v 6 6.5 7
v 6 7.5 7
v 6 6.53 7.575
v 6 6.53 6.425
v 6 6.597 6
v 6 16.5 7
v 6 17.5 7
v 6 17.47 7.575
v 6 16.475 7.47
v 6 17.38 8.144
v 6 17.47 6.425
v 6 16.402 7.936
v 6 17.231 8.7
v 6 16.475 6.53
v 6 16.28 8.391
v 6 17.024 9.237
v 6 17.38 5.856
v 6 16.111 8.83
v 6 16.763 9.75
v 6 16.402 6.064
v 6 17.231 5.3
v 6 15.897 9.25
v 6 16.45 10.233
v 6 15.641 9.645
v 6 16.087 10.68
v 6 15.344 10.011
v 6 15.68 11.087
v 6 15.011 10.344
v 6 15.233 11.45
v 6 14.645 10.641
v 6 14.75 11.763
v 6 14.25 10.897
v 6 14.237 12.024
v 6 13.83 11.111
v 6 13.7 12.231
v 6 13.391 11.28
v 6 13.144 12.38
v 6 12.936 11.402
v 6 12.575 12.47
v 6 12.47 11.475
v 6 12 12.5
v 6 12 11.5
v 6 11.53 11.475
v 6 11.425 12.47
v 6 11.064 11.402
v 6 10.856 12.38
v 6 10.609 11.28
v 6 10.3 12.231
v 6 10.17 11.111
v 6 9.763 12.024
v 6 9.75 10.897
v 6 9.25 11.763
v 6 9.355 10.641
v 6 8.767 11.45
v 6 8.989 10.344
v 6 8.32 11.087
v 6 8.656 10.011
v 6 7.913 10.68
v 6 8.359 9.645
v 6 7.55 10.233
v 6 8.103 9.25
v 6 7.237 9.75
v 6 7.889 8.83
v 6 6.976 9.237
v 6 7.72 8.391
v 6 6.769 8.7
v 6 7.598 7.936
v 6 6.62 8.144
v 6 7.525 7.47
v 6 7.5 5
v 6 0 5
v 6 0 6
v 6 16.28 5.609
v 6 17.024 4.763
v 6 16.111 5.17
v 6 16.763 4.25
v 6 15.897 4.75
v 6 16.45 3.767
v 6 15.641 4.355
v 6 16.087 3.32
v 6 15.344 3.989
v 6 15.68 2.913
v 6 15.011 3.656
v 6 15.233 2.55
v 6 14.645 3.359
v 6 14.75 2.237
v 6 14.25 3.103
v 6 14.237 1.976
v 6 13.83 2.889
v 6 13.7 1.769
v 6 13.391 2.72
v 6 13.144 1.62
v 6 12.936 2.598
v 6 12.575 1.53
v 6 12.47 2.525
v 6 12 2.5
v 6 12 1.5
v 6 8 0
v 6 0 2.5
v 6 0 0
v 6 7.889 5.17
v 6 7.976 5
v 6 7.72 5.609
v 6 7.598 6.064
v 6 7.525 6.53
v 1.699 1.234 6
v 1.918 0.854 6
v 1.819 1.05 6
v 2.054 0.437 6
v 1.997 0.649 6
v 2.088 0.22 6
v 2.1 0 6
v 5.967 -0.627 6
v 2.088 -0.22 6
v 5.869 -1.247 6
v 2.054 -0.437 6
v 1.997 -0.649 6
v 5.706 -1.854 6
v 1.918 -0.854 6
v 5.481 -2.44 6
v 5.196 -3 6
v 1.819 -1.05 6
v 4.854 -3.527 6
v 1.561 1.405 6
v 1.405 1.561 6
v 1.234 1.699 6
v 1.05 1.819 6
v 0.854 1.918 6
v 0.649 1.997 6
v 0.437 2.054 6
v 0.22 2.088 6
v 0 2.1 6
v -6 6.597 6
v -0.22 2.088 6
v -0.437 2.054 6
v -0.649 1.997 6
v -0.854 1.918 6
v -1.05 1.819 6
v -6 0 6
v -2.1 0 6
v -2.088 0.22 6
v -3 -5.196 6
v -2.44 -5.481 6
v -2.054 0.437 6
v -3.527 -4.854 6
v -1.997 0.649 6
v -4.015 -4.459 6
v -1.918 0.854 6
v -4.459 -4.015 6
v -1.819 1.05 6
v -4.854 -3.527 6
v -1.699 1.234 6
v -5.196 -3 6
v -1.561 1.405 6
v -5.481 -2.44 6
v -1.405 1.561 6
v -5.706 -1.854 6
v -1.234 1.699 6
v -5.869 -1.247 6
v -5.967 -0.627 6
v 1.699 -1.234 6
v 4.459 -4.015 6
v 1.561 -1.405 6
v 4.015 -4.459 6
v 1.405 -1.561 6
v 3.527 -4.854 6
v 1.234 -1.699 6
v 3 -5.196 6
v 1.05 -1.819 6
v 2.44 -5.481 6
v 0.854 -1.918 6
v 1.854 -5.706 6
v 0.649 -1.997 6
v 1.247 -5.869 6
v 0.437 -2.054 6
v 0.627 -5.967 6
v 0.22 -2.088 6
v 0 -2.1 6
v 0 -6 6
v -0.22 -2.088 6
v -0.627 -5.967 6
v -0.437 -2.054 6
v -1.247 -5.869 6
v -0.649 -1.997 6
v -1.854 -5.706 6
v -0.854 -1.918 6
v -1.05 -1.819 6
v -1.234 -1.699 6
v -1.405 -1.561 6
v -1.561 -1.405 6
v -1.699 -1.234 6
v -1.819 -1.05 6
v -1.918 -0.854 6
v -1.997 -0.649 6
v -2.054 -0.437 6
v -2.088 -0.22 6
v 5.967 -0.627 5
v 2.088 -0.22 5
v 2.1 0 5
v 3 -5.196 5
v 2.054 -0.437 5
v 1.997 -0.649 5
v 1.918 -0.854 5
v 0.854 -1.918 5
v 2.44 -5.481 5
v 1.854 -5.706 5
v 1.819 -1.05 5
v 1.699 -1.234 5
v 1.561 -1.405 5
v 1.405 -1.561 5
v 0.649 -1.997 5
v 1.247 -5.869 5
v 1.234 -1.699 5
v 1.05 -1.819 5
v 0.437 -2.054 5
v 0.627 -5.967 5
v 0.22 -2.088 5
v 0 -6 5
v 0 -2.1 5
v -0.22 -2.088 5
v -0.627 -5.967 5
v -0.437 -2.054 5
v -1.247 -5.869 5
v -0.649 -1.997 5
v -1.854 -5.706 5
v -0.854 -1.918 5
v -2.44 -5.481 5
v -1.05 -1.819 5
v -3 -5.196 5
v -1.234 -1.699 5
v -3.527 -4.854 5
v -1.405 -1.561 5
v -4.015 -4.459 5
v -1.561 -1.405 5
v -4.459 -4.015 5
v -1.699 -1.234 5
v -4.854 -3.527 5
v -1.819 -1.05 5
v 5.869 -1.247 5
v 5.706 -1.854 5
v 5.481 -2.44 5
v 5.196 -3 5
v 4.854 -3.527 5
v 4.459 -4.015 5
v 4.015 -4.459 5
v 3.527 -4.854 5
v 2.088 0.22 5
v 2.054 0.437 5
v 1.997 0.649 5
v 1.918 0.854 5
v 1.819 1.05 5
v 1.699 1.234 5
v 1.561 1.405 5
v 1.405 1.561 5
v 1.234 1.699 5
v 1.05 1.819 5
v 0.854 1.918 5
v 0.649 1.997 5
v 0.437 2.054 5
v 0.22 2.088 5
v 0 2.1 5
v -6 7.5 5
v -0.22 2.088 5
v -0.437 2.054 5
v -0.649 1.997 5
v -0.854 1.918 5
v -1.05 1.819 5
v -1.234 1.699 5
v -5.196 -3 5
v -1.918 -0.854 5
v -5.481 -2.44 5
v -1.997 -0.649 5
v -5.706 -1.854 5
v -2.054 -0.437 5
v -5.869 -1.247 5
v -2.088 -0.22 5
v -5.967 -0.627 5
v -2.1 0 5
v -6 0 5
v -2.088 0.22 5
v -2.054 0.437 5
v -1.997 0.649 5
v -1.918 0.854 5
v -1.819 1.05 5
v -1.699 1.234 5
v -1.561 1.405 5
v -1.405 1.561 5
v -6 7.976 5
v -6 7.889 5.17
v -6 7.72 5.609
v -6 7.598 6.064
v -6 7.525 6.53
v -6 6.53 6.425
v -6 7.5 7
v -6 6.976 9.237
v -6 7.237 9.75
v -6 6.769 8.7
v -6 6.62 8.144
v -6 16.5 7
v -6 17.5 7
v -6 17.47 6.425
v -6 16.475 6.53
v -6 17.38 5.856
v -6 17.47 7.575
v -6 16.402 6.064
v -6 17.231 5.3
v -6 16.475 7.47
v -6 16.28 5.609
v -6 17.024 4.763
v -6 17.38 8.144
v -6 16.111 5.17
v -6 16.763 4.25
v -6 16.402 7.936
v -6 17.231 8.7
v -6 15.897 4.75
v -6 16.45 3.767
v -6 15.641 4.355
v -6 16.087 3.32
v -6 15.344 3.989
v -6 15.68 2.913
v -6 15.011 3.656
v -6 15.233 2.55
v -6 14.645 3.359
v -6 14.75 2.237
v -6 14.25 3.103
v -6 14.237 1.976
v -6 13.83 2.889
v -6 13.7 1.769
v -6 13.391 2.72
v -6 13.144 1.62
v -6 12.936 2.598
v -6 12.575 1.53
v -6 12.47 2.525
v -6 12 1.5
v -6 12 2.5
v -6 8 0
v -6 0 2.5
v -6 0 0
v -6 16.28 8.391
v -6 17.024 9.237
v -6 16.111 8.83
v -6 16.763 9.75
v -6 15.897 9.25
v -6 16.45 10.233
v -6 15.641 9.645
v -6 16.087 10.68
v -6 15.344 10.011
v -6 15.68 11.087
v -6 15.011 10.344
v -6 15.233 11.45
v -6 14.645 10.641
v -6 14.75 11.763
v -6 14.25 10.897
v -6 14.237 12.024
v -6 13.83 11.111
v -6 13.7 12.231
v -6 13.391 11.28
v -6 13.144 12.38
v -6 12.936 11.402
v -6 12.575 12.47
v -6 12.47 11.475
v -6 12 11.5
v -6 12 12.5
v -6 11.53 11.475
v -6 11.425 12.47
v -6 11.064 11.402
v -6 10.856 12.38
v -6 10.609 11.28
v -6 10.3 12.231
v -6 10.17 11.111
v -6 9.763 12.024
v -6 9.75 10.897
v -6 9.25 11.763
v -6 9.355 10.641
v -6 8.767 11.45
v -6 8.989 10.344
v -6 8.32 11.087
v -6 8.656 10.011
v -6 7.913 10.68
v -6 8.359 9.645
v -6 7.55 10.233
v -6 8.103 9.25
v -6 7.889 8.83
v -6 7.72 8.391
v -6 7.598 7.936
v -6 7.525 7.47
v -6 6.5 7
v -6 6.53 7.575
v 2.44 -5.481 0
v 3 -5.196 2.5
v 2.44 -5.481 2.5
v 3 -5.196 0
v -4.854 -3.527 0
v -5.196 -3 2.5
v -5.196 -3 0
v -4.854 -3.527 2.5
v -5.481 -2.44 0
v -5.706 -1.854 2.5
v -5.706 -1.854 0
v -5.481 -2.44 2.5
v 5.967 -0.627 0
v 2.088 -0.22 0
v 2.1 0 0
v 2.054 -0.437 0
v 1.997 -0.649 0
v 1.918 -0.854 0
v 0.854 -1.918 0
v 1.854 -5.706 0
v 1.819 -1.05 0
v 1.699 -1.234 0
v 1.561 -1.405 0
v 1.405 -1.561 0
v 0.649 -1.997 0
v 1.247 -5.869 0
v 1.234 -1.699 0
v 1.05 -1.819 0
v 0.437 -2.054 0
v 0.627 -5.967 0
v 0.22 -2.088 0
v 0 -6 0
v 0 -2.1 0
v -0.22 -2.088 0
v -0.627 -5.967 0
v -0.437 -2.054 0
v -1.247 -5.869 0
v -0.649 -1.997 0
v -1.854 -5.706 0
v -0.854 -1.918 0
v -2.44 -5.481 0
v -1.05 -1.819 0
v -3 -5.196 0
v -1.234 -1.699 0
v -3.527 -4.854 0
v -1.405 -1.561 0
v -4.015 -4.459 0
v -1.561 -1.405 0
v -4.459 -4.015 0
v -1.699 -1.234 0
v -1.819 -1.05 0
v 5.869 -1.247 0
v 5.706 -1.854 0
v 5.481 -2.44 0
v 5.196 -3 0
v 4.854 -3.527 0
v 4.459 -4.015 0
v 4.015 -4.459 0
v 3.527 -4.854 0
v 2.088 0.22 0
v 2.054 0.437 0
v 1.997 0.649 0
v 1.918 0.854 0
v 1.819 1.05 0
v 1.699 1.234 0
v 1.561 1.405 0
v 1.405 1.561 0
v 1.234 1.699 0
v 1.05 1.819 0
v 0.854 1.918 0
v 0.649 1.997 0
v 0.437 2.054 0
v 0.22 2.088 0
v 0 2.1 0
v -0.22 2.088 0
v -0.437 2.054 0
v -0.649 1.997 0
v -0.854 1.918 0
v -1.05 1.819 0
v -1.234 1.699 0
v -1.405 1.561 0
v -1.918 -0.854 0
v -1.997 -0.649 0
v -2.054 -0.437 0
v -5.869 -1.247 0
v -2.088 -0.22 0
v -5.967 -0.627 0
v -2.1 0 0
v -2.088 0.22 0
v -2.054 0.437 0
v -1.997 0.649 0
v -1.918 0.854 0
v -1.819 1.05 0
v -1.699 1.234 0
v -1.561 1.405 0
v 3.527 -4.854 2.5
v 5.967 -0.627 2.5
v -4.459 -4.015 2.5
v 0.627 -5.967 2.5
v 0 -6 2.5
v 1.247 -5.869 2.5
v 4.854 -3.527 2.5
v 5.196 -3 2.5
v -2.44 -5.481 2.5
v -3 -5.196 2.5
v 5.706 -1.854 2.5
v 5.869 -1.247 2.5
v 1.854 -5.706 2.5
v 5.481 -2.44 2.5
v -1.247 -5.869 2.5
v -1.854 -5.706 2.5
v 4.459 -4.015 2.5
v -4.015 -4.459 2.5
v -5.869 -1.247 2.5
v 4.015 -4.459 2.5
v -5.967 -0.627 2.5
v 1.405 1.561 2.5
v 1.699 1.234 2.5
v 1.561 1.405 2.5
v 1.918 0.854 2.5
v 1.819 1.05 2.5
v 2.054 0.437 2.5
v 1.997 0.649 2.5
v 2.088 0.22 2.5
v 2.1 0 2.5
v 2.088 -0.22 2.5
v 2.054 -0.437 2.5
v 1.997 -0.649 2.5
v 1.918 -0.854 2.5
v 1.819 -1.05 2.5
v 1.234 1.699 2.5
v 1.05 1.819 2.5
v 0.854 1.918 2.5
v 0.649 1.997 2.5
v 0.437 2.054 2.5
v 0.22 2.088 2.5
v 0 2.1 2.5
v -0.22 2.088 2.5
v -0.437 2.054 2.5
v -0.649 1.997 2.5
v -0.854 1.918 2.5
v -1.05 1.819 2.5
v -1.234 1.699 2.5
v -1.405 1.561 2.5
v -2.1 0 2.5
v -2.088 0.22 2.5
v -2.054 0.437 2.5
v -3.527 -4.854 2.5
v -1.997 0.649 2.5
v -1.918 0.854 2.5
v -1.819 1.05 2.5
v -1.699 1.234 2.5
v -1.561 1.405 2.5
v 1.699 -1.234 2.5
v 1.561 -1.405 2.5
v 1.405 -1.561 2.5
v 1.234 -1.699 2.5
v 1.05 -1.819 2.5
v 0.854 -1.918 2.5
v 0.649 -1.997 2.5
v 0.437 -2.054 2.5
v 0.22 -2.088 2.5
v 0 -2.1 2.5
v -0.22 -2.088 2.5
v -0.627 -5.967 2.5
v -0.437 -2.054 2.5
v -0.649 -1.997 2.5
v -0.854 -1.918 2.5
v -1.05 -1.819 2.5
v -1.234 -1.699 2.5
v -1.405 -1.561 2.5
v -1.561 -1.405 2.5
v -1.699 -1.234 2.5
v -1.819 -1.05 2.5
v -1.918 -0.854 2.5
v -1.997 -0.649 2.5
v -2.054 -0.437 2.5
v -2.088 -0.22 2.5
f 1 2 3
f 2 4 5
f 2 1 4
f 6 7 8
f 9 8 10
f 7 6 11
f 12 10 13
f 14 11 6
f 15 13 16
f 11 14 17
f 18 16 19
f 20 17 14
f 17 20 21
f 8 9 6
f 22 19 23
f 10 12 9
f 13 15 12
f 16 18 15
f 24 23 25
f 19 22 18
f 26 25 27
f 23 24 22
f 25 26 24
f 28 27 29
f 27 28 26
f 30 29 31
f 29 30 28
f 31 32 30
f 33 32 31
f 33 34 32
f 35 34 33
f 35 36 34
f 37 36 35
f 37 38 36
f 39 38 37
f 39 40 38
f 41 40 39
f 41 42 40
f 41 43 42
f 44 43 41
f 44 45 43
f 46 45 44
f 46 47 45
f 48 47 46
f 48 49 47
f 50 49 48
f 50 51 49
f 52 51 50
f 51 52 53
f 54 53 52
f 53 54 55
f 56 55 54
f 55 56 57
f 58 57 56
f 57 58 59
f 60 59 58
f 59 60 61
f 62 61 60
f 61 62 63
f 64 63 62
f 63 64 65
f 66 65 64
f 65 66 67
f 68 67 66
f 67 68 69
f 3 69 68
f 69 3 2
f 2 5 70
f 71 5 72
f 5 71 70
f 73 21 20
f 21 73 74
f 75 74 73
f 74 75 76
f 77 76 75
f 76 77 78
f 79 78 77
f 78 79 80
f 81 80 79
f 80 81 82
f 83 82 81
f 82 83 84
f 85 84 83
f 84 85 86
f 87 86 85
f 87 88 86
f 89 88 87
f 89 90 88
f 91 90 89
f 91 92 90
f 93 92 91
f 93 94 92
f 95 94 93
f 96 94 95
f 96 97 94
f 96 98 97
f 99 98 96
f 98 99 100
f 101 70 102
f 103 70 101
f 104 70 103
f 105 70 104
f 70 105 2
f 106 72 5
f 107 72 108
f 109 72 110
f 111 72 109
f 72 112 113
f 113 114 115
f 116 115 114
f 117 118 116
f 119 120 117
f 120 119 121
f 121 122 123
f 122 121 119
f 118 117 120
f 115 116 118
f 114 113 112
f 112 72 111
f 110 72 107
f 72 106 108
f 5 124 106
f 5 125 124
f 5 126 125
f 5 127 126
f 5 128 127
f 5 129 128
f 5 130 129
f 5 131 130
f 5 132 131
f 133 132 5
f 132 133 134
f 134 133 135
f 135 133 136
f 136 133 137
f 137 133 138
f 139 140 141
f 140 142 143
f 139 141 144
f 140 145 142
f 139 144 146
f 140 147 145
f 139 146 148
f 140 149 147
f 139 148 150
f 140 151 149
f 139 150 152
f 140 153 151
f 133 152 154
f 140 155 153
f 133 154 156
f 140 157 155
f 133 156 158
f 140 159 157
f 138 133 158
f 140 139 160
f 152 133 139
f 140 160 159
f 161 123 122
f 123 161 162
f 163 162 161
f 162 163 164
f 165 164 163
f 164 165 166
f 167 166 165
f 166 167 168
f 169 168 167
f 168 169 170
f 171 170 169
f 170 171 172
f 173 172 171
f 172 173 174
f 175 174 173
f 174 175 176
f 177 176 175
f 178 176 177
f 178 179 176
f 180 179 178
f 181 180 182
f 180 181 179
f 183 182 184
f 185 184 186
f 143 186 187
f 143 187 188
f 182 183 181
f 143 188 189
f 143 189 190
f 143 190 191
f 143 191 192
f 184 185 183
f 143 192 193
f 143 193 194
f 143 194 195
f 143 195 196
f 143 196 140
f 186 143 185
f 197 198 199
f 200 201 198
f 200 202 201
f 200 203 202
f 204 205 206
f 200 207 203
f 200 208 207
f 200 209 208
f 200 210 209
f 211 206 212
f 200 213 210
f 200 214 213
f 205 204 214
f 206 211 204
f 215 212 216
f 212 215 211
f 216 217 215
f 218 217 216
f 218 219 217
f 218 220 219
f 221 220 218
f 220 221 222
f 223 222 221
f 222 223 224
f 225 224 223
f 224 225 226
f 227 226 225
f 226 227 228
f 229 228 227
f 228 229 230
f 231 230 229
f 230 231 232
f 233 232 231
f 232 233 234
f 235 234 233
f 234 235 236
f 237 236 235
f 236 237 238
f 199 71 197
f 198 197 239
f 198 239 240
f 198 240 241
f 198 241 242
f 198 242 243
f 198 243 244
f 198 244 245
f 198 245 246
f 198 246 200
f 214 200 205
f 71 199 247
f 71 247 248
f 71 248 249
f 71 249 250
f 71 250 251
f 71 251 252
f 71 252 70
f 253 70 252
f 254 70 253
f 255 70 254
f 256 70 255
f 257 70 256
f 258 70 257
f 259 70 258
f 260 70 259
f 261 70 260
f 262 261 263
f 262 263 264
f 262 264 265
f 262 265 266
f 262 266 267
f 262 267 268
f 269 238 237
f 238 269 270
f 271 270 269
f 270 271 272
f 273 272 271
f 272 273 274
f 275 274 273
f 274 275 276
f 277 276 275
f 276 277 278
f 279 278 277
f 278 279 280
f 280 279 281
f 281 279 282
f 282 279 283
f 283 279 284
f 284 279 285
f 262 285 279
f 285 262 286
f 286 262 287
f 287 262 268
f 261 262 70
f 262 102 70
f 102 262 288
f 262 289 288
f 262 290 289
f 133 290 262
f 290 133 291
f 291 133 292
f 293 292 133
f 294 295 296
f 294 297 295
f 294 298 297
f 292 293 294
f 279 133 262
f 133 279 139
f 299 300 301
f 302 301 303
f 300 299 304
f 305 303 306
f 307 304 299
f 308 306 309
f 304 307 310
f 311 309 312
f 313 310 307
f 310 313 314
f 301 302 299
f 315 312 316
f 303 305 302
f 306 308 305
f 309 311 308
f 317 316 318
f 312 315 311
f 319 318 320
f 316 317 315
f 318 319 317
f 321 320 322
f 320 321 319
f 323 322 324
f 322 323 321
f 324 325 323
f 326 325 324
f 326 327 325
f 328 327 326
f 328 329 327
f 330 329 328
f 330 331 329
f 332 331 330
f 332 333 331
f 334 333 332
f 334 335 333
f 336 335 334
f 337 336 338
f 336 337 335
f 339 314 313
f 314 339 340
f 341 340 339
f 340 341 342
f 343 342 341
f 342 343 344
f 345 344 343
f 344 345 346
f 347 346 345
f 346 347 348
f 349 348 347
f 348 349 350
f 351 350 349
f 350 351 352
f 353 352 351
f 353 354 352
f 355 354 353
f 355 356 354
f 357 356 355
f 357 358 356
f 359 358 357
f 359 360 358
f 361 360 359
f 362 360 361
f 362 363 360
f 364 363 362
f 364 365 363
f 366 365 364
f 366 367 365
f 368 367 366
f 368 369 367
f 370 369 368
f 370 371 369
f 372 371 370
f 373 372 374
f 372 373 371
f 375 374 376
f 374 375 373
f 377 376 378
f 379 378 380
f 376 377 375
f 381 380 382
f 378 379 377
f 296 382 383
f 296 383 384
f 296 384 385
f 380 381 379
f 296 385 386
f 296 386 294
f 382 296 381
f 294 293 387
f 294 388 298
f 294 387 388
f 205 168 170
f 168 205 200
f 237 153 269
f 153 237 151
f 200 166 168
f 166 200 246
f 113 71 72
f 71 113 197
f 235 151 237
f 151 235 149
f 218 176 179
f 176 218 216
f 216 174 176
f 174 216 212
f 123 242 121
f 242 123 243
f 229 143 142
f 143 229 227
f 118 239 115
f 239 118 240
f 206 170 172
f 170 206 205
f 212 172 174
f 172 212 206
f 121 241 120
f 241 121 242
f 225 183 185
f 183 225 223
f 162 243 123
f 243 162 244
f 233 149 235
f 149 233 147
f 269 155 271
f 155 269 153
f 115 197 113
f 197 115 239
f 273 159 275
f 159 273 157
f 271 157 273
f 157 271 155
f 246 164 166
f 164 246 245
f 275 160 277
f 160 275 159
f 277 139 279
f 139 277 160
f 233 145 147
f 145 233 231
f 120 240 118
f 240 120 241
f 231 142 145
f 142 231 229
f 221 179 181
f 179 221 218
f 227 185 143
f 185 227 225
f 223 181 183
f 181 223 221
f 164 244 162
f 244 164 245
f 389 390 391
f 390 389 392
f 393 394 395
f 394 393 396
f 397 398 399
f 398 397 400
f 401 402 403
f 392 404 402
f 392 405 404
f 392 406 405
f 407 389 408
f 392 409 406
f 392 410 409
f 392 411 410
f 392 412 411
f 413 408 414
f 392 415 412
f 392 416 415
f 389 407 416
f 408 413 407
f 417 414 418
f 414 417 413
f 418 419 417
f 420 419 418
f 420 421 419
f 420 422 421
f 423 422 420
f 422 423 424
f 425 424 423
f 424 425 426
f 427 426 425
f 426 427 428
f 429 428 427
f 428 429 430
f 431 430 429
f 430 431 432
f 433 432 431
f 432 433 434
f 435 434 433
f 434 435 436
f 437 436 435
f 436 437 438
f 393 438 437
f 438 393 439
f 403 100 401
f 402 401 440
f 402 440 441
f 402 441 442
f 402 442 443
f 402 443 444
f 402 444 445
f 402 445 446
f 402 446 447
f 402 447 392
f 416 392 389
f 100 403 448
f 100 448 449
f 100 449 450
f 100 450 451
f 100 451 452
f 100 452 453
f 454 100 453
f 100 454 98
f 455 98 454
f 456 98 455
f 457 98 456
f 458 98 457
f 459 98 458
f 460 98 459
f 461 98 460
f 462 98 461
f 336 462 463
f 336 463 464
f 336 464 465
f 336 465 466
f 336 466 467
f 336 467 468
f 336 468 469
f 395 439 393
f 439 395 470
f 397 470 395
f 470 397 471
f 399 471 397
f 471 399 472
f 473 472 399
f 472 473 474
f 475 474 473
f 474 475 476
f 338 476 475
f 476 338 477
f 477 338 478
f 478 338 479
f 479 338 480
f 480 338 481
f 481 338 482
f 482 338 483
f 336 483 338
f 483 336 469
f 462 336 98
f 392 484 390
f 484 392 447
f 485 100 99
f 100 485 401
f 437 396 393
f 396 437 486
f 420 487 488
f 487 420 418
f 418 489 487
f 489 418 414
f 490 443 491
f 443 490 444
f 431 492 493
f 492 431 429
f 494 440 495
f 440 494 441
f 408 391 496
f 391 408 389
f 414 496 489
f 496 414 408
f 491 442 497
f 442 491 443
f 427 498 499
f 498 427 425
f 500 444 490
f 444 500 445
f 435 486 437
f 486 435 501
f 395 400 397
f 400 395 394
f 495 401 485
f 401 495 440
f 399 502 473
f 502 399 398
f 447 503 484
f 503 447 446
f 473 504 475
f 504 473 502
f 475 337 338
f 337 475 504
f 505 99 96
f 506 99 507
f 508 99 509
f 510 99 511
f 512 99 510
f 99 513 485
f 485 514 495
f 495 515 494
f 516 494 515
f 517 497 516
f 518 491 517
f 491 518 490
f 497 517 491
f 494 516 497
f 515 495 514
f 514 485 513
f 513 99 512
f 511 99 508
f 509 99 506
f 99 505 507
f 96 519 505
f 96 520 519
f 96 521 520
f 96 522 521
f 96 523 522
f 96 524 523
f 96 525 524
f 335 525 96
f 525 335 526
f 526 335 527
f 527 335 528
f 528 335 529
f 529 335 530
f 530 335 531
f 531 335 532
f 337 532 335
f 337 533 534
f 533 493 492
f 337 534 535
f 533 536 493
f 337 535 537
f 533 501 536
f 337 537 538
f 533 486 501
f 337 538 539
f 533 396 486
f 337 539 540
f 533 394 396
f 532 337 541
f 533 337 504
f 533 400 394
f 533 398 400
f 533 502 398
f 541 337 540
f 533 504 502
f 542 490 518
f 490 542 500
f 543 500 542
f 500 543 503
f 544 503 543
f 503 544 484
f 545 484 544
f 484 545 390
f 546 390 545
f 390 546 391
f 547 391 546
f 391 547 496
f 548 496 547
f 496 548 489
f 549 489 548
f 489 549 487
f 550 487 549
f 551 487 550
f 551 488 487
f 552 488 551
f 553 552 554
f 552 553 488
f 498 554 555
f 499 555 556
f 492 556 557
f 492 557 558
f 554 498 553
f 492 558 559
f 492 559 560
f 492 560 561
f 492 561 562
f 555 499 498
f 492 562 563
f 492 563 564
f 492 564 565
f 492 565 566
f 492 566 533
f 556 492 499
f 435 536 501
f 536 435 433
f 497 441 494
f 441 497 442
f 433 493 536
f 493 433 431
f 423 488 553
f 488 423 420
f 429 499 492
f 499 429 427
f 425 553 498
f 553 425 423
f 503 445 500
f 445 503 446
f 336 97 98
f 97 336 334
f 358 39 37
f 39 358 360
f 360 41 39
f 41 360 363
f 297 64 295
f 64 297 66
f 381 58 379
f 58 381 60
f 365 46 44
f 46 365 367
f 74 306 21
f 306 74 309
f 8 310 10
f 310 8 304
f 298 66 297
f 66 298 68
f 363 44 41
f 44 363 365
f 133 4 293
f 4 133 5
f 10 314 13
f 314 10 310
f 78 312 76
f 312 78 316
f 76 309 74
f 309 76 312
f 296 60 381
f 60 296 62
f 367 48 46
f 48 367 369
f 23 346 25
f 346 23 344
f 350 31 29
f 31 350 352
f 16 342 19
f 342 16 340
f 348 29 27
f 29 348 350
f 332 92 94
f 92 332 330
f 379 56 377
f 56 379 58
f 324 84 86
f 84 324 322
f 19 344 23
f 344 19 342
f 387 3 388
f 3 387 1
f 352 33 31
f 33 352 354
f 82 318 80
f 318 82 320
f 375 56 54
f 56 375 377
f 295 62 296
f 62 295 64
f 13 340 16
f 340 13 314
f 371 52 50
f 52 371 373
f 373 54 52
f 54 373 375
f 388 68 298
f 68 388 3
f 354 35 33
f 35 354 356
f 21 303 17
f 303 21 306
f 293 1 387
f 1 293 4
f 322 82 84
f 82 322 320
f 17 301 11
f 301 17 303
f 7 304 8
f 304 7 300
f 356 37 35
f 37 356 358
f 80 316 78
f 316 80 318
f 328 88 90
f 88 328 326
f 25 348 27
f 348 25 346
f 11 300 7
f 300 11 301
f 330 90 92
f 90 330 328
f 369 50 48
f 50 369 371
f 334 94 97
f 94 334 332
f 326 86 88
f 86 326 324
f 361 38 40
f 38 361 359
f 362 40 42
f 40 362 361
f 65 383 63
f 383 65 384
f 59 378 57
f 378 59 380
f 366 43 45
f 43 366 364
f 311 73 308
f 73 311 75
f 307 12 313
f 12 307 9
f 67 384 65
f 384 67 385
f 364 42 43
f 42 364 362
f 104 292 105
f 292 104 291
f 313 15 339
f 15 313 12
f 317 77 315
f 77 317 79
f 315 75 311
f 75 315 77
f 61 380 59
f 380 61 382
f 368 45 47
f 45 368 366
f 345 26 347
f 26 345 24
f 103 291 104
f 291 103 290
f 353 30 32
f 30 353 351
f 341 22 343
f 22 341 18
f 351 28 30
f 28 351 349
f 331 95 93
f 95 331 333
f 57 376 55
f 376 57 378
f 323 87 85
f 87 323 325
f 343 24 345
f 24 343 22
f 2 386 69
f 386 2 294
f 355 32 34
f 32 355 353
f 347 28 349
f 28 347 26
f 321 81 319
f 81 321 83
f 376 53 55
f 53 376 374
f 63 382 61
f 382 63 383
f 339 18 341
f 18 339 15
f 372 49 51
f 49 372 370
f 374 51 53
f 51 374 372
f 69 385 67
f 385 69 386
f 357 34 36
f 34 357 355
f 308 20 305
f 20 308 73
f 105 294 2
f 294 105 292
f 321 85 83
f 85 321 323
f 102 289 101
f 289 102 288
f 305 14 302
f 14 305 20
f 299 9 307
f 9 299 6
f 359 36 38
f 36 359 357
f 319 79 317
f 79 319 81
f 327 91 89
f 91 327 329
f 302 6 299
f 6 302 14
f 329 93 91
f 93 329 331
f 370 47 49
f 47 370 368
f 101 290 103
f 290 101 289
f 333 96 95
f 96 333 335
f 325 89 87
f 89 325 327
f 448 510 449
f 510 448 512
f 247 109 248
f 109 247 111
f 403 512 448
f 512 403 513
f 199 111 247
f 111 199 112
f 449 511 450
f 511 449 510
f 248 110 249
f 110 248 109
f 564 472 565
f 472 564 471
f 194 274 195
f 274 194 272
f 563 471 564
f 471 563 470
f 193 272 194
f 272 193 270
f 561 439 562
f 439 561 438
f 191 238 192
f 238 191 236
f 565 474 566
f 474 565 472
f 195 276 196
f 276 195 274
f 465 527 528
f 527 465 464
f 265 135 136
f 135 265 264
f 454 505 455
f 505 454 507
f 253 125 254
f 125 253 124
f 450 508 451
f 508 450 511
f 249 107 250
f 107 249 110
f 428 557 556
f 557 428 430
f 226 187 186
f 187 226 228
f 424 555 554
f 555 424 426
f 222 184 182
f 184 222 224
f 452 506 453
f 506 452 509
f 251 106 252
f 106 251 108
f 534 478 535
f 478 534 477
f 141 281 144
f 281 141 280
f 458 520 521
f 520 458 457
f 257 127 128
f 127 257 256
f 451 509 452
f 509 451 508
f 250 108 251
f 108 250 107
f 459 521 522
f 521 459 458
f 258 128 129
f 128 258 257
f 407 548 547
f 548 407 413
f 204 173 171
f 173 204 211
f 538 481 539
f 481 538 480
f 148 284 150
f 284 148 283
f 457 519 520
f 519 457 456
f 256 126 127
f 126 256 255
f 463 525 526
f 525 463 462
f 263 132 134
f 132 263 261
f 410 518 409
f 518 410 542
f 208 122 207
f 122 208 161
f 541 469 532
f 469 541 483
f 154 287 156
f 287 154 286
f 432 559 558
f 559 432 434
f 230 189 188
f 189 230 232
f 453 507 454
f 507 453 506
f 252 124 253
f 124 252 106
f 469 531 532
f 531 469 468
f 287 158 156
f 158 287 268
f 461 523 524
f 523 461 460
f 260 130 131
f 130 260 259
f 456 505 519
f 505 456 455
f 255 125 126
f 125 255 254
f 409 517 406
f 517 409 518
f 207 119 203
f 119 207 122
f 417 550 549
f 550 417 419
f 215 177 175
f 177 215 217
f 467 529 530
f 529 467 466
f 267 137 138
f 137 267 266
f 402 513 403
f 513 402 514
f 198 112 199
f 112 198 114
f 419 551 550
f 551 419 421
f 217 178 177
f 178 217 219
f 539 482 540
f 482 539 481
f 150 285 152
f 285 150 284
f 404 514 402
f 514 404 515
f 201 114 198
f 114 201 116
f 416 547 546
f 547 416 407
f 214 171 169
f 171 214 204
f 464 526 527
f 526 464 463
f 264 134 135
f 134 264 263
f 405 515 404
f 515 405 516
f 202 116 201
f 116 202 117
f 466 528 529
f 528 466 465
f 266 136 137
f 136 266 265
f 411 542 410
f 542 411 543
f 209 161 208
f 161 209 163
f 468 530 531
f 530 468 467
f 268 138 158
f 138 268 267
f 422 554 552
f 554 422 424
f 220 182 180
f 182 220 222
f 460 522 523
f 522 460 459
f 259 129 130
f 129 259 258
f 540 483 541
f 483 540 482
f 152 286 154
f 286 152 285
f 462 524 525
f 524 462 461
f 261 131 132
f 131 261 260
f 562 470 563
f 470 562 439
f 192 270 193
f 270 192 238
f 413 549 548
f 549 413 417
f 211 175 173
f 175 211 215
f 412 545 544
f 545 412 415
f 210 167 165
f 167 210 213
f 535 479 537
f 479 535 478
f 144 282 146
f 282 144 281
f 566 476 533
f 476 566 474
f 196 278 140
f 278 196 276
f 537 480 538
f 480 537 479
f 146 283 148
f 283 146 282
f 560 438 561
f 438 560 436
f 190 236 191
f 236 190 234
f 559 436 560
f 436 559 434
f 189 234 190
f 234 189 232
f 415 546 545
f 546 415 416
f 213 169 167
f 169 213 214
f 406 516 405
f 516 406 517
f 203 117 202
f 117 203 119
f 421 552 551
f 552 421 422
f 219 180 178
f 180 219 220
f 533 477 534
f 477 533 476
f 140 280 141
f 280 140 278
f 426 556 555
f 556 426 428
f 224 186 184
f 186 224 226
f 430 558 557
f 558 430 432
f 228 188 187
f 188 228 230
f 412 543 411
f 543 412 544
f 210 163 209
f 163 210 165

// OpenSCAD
bolt_hole = 4.2;

cable_hole = 9;
rise = 2.5;
thickness = 1;
gap = 2.5;

$fn = 60;

module tabs() {
	//base
	cylinder(h = rise , r = 6 );
	translate([-6,0,0])
		hull() {
			cube([12,8,rise]);
			translate([0,12-1,rise - thickness])cube([12,1,thickness]);
		}


	//top
	translate ([0,0,rise + gap])
	{
		translate([-6,0,0])cube([12,12 - cable_hole/2,thickness]);
		cylinder(h = thickness , r = 6 );
	}

}

module loop() {
	translate([6,0,0])
	rotate([0,-90, 0])
	difference() {
		cylinder(h = 12, r = cable_hole/2 + thickness);
		cylinder(h = 12, r = cable_hole/2);
		translate([-cable_hole/2 ,-cable_hole , 0])
		cube([gap,cable_hole,12]);
	}
	

}

module main() {
	tabs();
	translate([0, 12,cable_hole/2 + rise])

	//loop();
	loop();

}

difference() {
	main();
	cylinder(h = 20, r = bolt_hole/2);
}

//tabs();
